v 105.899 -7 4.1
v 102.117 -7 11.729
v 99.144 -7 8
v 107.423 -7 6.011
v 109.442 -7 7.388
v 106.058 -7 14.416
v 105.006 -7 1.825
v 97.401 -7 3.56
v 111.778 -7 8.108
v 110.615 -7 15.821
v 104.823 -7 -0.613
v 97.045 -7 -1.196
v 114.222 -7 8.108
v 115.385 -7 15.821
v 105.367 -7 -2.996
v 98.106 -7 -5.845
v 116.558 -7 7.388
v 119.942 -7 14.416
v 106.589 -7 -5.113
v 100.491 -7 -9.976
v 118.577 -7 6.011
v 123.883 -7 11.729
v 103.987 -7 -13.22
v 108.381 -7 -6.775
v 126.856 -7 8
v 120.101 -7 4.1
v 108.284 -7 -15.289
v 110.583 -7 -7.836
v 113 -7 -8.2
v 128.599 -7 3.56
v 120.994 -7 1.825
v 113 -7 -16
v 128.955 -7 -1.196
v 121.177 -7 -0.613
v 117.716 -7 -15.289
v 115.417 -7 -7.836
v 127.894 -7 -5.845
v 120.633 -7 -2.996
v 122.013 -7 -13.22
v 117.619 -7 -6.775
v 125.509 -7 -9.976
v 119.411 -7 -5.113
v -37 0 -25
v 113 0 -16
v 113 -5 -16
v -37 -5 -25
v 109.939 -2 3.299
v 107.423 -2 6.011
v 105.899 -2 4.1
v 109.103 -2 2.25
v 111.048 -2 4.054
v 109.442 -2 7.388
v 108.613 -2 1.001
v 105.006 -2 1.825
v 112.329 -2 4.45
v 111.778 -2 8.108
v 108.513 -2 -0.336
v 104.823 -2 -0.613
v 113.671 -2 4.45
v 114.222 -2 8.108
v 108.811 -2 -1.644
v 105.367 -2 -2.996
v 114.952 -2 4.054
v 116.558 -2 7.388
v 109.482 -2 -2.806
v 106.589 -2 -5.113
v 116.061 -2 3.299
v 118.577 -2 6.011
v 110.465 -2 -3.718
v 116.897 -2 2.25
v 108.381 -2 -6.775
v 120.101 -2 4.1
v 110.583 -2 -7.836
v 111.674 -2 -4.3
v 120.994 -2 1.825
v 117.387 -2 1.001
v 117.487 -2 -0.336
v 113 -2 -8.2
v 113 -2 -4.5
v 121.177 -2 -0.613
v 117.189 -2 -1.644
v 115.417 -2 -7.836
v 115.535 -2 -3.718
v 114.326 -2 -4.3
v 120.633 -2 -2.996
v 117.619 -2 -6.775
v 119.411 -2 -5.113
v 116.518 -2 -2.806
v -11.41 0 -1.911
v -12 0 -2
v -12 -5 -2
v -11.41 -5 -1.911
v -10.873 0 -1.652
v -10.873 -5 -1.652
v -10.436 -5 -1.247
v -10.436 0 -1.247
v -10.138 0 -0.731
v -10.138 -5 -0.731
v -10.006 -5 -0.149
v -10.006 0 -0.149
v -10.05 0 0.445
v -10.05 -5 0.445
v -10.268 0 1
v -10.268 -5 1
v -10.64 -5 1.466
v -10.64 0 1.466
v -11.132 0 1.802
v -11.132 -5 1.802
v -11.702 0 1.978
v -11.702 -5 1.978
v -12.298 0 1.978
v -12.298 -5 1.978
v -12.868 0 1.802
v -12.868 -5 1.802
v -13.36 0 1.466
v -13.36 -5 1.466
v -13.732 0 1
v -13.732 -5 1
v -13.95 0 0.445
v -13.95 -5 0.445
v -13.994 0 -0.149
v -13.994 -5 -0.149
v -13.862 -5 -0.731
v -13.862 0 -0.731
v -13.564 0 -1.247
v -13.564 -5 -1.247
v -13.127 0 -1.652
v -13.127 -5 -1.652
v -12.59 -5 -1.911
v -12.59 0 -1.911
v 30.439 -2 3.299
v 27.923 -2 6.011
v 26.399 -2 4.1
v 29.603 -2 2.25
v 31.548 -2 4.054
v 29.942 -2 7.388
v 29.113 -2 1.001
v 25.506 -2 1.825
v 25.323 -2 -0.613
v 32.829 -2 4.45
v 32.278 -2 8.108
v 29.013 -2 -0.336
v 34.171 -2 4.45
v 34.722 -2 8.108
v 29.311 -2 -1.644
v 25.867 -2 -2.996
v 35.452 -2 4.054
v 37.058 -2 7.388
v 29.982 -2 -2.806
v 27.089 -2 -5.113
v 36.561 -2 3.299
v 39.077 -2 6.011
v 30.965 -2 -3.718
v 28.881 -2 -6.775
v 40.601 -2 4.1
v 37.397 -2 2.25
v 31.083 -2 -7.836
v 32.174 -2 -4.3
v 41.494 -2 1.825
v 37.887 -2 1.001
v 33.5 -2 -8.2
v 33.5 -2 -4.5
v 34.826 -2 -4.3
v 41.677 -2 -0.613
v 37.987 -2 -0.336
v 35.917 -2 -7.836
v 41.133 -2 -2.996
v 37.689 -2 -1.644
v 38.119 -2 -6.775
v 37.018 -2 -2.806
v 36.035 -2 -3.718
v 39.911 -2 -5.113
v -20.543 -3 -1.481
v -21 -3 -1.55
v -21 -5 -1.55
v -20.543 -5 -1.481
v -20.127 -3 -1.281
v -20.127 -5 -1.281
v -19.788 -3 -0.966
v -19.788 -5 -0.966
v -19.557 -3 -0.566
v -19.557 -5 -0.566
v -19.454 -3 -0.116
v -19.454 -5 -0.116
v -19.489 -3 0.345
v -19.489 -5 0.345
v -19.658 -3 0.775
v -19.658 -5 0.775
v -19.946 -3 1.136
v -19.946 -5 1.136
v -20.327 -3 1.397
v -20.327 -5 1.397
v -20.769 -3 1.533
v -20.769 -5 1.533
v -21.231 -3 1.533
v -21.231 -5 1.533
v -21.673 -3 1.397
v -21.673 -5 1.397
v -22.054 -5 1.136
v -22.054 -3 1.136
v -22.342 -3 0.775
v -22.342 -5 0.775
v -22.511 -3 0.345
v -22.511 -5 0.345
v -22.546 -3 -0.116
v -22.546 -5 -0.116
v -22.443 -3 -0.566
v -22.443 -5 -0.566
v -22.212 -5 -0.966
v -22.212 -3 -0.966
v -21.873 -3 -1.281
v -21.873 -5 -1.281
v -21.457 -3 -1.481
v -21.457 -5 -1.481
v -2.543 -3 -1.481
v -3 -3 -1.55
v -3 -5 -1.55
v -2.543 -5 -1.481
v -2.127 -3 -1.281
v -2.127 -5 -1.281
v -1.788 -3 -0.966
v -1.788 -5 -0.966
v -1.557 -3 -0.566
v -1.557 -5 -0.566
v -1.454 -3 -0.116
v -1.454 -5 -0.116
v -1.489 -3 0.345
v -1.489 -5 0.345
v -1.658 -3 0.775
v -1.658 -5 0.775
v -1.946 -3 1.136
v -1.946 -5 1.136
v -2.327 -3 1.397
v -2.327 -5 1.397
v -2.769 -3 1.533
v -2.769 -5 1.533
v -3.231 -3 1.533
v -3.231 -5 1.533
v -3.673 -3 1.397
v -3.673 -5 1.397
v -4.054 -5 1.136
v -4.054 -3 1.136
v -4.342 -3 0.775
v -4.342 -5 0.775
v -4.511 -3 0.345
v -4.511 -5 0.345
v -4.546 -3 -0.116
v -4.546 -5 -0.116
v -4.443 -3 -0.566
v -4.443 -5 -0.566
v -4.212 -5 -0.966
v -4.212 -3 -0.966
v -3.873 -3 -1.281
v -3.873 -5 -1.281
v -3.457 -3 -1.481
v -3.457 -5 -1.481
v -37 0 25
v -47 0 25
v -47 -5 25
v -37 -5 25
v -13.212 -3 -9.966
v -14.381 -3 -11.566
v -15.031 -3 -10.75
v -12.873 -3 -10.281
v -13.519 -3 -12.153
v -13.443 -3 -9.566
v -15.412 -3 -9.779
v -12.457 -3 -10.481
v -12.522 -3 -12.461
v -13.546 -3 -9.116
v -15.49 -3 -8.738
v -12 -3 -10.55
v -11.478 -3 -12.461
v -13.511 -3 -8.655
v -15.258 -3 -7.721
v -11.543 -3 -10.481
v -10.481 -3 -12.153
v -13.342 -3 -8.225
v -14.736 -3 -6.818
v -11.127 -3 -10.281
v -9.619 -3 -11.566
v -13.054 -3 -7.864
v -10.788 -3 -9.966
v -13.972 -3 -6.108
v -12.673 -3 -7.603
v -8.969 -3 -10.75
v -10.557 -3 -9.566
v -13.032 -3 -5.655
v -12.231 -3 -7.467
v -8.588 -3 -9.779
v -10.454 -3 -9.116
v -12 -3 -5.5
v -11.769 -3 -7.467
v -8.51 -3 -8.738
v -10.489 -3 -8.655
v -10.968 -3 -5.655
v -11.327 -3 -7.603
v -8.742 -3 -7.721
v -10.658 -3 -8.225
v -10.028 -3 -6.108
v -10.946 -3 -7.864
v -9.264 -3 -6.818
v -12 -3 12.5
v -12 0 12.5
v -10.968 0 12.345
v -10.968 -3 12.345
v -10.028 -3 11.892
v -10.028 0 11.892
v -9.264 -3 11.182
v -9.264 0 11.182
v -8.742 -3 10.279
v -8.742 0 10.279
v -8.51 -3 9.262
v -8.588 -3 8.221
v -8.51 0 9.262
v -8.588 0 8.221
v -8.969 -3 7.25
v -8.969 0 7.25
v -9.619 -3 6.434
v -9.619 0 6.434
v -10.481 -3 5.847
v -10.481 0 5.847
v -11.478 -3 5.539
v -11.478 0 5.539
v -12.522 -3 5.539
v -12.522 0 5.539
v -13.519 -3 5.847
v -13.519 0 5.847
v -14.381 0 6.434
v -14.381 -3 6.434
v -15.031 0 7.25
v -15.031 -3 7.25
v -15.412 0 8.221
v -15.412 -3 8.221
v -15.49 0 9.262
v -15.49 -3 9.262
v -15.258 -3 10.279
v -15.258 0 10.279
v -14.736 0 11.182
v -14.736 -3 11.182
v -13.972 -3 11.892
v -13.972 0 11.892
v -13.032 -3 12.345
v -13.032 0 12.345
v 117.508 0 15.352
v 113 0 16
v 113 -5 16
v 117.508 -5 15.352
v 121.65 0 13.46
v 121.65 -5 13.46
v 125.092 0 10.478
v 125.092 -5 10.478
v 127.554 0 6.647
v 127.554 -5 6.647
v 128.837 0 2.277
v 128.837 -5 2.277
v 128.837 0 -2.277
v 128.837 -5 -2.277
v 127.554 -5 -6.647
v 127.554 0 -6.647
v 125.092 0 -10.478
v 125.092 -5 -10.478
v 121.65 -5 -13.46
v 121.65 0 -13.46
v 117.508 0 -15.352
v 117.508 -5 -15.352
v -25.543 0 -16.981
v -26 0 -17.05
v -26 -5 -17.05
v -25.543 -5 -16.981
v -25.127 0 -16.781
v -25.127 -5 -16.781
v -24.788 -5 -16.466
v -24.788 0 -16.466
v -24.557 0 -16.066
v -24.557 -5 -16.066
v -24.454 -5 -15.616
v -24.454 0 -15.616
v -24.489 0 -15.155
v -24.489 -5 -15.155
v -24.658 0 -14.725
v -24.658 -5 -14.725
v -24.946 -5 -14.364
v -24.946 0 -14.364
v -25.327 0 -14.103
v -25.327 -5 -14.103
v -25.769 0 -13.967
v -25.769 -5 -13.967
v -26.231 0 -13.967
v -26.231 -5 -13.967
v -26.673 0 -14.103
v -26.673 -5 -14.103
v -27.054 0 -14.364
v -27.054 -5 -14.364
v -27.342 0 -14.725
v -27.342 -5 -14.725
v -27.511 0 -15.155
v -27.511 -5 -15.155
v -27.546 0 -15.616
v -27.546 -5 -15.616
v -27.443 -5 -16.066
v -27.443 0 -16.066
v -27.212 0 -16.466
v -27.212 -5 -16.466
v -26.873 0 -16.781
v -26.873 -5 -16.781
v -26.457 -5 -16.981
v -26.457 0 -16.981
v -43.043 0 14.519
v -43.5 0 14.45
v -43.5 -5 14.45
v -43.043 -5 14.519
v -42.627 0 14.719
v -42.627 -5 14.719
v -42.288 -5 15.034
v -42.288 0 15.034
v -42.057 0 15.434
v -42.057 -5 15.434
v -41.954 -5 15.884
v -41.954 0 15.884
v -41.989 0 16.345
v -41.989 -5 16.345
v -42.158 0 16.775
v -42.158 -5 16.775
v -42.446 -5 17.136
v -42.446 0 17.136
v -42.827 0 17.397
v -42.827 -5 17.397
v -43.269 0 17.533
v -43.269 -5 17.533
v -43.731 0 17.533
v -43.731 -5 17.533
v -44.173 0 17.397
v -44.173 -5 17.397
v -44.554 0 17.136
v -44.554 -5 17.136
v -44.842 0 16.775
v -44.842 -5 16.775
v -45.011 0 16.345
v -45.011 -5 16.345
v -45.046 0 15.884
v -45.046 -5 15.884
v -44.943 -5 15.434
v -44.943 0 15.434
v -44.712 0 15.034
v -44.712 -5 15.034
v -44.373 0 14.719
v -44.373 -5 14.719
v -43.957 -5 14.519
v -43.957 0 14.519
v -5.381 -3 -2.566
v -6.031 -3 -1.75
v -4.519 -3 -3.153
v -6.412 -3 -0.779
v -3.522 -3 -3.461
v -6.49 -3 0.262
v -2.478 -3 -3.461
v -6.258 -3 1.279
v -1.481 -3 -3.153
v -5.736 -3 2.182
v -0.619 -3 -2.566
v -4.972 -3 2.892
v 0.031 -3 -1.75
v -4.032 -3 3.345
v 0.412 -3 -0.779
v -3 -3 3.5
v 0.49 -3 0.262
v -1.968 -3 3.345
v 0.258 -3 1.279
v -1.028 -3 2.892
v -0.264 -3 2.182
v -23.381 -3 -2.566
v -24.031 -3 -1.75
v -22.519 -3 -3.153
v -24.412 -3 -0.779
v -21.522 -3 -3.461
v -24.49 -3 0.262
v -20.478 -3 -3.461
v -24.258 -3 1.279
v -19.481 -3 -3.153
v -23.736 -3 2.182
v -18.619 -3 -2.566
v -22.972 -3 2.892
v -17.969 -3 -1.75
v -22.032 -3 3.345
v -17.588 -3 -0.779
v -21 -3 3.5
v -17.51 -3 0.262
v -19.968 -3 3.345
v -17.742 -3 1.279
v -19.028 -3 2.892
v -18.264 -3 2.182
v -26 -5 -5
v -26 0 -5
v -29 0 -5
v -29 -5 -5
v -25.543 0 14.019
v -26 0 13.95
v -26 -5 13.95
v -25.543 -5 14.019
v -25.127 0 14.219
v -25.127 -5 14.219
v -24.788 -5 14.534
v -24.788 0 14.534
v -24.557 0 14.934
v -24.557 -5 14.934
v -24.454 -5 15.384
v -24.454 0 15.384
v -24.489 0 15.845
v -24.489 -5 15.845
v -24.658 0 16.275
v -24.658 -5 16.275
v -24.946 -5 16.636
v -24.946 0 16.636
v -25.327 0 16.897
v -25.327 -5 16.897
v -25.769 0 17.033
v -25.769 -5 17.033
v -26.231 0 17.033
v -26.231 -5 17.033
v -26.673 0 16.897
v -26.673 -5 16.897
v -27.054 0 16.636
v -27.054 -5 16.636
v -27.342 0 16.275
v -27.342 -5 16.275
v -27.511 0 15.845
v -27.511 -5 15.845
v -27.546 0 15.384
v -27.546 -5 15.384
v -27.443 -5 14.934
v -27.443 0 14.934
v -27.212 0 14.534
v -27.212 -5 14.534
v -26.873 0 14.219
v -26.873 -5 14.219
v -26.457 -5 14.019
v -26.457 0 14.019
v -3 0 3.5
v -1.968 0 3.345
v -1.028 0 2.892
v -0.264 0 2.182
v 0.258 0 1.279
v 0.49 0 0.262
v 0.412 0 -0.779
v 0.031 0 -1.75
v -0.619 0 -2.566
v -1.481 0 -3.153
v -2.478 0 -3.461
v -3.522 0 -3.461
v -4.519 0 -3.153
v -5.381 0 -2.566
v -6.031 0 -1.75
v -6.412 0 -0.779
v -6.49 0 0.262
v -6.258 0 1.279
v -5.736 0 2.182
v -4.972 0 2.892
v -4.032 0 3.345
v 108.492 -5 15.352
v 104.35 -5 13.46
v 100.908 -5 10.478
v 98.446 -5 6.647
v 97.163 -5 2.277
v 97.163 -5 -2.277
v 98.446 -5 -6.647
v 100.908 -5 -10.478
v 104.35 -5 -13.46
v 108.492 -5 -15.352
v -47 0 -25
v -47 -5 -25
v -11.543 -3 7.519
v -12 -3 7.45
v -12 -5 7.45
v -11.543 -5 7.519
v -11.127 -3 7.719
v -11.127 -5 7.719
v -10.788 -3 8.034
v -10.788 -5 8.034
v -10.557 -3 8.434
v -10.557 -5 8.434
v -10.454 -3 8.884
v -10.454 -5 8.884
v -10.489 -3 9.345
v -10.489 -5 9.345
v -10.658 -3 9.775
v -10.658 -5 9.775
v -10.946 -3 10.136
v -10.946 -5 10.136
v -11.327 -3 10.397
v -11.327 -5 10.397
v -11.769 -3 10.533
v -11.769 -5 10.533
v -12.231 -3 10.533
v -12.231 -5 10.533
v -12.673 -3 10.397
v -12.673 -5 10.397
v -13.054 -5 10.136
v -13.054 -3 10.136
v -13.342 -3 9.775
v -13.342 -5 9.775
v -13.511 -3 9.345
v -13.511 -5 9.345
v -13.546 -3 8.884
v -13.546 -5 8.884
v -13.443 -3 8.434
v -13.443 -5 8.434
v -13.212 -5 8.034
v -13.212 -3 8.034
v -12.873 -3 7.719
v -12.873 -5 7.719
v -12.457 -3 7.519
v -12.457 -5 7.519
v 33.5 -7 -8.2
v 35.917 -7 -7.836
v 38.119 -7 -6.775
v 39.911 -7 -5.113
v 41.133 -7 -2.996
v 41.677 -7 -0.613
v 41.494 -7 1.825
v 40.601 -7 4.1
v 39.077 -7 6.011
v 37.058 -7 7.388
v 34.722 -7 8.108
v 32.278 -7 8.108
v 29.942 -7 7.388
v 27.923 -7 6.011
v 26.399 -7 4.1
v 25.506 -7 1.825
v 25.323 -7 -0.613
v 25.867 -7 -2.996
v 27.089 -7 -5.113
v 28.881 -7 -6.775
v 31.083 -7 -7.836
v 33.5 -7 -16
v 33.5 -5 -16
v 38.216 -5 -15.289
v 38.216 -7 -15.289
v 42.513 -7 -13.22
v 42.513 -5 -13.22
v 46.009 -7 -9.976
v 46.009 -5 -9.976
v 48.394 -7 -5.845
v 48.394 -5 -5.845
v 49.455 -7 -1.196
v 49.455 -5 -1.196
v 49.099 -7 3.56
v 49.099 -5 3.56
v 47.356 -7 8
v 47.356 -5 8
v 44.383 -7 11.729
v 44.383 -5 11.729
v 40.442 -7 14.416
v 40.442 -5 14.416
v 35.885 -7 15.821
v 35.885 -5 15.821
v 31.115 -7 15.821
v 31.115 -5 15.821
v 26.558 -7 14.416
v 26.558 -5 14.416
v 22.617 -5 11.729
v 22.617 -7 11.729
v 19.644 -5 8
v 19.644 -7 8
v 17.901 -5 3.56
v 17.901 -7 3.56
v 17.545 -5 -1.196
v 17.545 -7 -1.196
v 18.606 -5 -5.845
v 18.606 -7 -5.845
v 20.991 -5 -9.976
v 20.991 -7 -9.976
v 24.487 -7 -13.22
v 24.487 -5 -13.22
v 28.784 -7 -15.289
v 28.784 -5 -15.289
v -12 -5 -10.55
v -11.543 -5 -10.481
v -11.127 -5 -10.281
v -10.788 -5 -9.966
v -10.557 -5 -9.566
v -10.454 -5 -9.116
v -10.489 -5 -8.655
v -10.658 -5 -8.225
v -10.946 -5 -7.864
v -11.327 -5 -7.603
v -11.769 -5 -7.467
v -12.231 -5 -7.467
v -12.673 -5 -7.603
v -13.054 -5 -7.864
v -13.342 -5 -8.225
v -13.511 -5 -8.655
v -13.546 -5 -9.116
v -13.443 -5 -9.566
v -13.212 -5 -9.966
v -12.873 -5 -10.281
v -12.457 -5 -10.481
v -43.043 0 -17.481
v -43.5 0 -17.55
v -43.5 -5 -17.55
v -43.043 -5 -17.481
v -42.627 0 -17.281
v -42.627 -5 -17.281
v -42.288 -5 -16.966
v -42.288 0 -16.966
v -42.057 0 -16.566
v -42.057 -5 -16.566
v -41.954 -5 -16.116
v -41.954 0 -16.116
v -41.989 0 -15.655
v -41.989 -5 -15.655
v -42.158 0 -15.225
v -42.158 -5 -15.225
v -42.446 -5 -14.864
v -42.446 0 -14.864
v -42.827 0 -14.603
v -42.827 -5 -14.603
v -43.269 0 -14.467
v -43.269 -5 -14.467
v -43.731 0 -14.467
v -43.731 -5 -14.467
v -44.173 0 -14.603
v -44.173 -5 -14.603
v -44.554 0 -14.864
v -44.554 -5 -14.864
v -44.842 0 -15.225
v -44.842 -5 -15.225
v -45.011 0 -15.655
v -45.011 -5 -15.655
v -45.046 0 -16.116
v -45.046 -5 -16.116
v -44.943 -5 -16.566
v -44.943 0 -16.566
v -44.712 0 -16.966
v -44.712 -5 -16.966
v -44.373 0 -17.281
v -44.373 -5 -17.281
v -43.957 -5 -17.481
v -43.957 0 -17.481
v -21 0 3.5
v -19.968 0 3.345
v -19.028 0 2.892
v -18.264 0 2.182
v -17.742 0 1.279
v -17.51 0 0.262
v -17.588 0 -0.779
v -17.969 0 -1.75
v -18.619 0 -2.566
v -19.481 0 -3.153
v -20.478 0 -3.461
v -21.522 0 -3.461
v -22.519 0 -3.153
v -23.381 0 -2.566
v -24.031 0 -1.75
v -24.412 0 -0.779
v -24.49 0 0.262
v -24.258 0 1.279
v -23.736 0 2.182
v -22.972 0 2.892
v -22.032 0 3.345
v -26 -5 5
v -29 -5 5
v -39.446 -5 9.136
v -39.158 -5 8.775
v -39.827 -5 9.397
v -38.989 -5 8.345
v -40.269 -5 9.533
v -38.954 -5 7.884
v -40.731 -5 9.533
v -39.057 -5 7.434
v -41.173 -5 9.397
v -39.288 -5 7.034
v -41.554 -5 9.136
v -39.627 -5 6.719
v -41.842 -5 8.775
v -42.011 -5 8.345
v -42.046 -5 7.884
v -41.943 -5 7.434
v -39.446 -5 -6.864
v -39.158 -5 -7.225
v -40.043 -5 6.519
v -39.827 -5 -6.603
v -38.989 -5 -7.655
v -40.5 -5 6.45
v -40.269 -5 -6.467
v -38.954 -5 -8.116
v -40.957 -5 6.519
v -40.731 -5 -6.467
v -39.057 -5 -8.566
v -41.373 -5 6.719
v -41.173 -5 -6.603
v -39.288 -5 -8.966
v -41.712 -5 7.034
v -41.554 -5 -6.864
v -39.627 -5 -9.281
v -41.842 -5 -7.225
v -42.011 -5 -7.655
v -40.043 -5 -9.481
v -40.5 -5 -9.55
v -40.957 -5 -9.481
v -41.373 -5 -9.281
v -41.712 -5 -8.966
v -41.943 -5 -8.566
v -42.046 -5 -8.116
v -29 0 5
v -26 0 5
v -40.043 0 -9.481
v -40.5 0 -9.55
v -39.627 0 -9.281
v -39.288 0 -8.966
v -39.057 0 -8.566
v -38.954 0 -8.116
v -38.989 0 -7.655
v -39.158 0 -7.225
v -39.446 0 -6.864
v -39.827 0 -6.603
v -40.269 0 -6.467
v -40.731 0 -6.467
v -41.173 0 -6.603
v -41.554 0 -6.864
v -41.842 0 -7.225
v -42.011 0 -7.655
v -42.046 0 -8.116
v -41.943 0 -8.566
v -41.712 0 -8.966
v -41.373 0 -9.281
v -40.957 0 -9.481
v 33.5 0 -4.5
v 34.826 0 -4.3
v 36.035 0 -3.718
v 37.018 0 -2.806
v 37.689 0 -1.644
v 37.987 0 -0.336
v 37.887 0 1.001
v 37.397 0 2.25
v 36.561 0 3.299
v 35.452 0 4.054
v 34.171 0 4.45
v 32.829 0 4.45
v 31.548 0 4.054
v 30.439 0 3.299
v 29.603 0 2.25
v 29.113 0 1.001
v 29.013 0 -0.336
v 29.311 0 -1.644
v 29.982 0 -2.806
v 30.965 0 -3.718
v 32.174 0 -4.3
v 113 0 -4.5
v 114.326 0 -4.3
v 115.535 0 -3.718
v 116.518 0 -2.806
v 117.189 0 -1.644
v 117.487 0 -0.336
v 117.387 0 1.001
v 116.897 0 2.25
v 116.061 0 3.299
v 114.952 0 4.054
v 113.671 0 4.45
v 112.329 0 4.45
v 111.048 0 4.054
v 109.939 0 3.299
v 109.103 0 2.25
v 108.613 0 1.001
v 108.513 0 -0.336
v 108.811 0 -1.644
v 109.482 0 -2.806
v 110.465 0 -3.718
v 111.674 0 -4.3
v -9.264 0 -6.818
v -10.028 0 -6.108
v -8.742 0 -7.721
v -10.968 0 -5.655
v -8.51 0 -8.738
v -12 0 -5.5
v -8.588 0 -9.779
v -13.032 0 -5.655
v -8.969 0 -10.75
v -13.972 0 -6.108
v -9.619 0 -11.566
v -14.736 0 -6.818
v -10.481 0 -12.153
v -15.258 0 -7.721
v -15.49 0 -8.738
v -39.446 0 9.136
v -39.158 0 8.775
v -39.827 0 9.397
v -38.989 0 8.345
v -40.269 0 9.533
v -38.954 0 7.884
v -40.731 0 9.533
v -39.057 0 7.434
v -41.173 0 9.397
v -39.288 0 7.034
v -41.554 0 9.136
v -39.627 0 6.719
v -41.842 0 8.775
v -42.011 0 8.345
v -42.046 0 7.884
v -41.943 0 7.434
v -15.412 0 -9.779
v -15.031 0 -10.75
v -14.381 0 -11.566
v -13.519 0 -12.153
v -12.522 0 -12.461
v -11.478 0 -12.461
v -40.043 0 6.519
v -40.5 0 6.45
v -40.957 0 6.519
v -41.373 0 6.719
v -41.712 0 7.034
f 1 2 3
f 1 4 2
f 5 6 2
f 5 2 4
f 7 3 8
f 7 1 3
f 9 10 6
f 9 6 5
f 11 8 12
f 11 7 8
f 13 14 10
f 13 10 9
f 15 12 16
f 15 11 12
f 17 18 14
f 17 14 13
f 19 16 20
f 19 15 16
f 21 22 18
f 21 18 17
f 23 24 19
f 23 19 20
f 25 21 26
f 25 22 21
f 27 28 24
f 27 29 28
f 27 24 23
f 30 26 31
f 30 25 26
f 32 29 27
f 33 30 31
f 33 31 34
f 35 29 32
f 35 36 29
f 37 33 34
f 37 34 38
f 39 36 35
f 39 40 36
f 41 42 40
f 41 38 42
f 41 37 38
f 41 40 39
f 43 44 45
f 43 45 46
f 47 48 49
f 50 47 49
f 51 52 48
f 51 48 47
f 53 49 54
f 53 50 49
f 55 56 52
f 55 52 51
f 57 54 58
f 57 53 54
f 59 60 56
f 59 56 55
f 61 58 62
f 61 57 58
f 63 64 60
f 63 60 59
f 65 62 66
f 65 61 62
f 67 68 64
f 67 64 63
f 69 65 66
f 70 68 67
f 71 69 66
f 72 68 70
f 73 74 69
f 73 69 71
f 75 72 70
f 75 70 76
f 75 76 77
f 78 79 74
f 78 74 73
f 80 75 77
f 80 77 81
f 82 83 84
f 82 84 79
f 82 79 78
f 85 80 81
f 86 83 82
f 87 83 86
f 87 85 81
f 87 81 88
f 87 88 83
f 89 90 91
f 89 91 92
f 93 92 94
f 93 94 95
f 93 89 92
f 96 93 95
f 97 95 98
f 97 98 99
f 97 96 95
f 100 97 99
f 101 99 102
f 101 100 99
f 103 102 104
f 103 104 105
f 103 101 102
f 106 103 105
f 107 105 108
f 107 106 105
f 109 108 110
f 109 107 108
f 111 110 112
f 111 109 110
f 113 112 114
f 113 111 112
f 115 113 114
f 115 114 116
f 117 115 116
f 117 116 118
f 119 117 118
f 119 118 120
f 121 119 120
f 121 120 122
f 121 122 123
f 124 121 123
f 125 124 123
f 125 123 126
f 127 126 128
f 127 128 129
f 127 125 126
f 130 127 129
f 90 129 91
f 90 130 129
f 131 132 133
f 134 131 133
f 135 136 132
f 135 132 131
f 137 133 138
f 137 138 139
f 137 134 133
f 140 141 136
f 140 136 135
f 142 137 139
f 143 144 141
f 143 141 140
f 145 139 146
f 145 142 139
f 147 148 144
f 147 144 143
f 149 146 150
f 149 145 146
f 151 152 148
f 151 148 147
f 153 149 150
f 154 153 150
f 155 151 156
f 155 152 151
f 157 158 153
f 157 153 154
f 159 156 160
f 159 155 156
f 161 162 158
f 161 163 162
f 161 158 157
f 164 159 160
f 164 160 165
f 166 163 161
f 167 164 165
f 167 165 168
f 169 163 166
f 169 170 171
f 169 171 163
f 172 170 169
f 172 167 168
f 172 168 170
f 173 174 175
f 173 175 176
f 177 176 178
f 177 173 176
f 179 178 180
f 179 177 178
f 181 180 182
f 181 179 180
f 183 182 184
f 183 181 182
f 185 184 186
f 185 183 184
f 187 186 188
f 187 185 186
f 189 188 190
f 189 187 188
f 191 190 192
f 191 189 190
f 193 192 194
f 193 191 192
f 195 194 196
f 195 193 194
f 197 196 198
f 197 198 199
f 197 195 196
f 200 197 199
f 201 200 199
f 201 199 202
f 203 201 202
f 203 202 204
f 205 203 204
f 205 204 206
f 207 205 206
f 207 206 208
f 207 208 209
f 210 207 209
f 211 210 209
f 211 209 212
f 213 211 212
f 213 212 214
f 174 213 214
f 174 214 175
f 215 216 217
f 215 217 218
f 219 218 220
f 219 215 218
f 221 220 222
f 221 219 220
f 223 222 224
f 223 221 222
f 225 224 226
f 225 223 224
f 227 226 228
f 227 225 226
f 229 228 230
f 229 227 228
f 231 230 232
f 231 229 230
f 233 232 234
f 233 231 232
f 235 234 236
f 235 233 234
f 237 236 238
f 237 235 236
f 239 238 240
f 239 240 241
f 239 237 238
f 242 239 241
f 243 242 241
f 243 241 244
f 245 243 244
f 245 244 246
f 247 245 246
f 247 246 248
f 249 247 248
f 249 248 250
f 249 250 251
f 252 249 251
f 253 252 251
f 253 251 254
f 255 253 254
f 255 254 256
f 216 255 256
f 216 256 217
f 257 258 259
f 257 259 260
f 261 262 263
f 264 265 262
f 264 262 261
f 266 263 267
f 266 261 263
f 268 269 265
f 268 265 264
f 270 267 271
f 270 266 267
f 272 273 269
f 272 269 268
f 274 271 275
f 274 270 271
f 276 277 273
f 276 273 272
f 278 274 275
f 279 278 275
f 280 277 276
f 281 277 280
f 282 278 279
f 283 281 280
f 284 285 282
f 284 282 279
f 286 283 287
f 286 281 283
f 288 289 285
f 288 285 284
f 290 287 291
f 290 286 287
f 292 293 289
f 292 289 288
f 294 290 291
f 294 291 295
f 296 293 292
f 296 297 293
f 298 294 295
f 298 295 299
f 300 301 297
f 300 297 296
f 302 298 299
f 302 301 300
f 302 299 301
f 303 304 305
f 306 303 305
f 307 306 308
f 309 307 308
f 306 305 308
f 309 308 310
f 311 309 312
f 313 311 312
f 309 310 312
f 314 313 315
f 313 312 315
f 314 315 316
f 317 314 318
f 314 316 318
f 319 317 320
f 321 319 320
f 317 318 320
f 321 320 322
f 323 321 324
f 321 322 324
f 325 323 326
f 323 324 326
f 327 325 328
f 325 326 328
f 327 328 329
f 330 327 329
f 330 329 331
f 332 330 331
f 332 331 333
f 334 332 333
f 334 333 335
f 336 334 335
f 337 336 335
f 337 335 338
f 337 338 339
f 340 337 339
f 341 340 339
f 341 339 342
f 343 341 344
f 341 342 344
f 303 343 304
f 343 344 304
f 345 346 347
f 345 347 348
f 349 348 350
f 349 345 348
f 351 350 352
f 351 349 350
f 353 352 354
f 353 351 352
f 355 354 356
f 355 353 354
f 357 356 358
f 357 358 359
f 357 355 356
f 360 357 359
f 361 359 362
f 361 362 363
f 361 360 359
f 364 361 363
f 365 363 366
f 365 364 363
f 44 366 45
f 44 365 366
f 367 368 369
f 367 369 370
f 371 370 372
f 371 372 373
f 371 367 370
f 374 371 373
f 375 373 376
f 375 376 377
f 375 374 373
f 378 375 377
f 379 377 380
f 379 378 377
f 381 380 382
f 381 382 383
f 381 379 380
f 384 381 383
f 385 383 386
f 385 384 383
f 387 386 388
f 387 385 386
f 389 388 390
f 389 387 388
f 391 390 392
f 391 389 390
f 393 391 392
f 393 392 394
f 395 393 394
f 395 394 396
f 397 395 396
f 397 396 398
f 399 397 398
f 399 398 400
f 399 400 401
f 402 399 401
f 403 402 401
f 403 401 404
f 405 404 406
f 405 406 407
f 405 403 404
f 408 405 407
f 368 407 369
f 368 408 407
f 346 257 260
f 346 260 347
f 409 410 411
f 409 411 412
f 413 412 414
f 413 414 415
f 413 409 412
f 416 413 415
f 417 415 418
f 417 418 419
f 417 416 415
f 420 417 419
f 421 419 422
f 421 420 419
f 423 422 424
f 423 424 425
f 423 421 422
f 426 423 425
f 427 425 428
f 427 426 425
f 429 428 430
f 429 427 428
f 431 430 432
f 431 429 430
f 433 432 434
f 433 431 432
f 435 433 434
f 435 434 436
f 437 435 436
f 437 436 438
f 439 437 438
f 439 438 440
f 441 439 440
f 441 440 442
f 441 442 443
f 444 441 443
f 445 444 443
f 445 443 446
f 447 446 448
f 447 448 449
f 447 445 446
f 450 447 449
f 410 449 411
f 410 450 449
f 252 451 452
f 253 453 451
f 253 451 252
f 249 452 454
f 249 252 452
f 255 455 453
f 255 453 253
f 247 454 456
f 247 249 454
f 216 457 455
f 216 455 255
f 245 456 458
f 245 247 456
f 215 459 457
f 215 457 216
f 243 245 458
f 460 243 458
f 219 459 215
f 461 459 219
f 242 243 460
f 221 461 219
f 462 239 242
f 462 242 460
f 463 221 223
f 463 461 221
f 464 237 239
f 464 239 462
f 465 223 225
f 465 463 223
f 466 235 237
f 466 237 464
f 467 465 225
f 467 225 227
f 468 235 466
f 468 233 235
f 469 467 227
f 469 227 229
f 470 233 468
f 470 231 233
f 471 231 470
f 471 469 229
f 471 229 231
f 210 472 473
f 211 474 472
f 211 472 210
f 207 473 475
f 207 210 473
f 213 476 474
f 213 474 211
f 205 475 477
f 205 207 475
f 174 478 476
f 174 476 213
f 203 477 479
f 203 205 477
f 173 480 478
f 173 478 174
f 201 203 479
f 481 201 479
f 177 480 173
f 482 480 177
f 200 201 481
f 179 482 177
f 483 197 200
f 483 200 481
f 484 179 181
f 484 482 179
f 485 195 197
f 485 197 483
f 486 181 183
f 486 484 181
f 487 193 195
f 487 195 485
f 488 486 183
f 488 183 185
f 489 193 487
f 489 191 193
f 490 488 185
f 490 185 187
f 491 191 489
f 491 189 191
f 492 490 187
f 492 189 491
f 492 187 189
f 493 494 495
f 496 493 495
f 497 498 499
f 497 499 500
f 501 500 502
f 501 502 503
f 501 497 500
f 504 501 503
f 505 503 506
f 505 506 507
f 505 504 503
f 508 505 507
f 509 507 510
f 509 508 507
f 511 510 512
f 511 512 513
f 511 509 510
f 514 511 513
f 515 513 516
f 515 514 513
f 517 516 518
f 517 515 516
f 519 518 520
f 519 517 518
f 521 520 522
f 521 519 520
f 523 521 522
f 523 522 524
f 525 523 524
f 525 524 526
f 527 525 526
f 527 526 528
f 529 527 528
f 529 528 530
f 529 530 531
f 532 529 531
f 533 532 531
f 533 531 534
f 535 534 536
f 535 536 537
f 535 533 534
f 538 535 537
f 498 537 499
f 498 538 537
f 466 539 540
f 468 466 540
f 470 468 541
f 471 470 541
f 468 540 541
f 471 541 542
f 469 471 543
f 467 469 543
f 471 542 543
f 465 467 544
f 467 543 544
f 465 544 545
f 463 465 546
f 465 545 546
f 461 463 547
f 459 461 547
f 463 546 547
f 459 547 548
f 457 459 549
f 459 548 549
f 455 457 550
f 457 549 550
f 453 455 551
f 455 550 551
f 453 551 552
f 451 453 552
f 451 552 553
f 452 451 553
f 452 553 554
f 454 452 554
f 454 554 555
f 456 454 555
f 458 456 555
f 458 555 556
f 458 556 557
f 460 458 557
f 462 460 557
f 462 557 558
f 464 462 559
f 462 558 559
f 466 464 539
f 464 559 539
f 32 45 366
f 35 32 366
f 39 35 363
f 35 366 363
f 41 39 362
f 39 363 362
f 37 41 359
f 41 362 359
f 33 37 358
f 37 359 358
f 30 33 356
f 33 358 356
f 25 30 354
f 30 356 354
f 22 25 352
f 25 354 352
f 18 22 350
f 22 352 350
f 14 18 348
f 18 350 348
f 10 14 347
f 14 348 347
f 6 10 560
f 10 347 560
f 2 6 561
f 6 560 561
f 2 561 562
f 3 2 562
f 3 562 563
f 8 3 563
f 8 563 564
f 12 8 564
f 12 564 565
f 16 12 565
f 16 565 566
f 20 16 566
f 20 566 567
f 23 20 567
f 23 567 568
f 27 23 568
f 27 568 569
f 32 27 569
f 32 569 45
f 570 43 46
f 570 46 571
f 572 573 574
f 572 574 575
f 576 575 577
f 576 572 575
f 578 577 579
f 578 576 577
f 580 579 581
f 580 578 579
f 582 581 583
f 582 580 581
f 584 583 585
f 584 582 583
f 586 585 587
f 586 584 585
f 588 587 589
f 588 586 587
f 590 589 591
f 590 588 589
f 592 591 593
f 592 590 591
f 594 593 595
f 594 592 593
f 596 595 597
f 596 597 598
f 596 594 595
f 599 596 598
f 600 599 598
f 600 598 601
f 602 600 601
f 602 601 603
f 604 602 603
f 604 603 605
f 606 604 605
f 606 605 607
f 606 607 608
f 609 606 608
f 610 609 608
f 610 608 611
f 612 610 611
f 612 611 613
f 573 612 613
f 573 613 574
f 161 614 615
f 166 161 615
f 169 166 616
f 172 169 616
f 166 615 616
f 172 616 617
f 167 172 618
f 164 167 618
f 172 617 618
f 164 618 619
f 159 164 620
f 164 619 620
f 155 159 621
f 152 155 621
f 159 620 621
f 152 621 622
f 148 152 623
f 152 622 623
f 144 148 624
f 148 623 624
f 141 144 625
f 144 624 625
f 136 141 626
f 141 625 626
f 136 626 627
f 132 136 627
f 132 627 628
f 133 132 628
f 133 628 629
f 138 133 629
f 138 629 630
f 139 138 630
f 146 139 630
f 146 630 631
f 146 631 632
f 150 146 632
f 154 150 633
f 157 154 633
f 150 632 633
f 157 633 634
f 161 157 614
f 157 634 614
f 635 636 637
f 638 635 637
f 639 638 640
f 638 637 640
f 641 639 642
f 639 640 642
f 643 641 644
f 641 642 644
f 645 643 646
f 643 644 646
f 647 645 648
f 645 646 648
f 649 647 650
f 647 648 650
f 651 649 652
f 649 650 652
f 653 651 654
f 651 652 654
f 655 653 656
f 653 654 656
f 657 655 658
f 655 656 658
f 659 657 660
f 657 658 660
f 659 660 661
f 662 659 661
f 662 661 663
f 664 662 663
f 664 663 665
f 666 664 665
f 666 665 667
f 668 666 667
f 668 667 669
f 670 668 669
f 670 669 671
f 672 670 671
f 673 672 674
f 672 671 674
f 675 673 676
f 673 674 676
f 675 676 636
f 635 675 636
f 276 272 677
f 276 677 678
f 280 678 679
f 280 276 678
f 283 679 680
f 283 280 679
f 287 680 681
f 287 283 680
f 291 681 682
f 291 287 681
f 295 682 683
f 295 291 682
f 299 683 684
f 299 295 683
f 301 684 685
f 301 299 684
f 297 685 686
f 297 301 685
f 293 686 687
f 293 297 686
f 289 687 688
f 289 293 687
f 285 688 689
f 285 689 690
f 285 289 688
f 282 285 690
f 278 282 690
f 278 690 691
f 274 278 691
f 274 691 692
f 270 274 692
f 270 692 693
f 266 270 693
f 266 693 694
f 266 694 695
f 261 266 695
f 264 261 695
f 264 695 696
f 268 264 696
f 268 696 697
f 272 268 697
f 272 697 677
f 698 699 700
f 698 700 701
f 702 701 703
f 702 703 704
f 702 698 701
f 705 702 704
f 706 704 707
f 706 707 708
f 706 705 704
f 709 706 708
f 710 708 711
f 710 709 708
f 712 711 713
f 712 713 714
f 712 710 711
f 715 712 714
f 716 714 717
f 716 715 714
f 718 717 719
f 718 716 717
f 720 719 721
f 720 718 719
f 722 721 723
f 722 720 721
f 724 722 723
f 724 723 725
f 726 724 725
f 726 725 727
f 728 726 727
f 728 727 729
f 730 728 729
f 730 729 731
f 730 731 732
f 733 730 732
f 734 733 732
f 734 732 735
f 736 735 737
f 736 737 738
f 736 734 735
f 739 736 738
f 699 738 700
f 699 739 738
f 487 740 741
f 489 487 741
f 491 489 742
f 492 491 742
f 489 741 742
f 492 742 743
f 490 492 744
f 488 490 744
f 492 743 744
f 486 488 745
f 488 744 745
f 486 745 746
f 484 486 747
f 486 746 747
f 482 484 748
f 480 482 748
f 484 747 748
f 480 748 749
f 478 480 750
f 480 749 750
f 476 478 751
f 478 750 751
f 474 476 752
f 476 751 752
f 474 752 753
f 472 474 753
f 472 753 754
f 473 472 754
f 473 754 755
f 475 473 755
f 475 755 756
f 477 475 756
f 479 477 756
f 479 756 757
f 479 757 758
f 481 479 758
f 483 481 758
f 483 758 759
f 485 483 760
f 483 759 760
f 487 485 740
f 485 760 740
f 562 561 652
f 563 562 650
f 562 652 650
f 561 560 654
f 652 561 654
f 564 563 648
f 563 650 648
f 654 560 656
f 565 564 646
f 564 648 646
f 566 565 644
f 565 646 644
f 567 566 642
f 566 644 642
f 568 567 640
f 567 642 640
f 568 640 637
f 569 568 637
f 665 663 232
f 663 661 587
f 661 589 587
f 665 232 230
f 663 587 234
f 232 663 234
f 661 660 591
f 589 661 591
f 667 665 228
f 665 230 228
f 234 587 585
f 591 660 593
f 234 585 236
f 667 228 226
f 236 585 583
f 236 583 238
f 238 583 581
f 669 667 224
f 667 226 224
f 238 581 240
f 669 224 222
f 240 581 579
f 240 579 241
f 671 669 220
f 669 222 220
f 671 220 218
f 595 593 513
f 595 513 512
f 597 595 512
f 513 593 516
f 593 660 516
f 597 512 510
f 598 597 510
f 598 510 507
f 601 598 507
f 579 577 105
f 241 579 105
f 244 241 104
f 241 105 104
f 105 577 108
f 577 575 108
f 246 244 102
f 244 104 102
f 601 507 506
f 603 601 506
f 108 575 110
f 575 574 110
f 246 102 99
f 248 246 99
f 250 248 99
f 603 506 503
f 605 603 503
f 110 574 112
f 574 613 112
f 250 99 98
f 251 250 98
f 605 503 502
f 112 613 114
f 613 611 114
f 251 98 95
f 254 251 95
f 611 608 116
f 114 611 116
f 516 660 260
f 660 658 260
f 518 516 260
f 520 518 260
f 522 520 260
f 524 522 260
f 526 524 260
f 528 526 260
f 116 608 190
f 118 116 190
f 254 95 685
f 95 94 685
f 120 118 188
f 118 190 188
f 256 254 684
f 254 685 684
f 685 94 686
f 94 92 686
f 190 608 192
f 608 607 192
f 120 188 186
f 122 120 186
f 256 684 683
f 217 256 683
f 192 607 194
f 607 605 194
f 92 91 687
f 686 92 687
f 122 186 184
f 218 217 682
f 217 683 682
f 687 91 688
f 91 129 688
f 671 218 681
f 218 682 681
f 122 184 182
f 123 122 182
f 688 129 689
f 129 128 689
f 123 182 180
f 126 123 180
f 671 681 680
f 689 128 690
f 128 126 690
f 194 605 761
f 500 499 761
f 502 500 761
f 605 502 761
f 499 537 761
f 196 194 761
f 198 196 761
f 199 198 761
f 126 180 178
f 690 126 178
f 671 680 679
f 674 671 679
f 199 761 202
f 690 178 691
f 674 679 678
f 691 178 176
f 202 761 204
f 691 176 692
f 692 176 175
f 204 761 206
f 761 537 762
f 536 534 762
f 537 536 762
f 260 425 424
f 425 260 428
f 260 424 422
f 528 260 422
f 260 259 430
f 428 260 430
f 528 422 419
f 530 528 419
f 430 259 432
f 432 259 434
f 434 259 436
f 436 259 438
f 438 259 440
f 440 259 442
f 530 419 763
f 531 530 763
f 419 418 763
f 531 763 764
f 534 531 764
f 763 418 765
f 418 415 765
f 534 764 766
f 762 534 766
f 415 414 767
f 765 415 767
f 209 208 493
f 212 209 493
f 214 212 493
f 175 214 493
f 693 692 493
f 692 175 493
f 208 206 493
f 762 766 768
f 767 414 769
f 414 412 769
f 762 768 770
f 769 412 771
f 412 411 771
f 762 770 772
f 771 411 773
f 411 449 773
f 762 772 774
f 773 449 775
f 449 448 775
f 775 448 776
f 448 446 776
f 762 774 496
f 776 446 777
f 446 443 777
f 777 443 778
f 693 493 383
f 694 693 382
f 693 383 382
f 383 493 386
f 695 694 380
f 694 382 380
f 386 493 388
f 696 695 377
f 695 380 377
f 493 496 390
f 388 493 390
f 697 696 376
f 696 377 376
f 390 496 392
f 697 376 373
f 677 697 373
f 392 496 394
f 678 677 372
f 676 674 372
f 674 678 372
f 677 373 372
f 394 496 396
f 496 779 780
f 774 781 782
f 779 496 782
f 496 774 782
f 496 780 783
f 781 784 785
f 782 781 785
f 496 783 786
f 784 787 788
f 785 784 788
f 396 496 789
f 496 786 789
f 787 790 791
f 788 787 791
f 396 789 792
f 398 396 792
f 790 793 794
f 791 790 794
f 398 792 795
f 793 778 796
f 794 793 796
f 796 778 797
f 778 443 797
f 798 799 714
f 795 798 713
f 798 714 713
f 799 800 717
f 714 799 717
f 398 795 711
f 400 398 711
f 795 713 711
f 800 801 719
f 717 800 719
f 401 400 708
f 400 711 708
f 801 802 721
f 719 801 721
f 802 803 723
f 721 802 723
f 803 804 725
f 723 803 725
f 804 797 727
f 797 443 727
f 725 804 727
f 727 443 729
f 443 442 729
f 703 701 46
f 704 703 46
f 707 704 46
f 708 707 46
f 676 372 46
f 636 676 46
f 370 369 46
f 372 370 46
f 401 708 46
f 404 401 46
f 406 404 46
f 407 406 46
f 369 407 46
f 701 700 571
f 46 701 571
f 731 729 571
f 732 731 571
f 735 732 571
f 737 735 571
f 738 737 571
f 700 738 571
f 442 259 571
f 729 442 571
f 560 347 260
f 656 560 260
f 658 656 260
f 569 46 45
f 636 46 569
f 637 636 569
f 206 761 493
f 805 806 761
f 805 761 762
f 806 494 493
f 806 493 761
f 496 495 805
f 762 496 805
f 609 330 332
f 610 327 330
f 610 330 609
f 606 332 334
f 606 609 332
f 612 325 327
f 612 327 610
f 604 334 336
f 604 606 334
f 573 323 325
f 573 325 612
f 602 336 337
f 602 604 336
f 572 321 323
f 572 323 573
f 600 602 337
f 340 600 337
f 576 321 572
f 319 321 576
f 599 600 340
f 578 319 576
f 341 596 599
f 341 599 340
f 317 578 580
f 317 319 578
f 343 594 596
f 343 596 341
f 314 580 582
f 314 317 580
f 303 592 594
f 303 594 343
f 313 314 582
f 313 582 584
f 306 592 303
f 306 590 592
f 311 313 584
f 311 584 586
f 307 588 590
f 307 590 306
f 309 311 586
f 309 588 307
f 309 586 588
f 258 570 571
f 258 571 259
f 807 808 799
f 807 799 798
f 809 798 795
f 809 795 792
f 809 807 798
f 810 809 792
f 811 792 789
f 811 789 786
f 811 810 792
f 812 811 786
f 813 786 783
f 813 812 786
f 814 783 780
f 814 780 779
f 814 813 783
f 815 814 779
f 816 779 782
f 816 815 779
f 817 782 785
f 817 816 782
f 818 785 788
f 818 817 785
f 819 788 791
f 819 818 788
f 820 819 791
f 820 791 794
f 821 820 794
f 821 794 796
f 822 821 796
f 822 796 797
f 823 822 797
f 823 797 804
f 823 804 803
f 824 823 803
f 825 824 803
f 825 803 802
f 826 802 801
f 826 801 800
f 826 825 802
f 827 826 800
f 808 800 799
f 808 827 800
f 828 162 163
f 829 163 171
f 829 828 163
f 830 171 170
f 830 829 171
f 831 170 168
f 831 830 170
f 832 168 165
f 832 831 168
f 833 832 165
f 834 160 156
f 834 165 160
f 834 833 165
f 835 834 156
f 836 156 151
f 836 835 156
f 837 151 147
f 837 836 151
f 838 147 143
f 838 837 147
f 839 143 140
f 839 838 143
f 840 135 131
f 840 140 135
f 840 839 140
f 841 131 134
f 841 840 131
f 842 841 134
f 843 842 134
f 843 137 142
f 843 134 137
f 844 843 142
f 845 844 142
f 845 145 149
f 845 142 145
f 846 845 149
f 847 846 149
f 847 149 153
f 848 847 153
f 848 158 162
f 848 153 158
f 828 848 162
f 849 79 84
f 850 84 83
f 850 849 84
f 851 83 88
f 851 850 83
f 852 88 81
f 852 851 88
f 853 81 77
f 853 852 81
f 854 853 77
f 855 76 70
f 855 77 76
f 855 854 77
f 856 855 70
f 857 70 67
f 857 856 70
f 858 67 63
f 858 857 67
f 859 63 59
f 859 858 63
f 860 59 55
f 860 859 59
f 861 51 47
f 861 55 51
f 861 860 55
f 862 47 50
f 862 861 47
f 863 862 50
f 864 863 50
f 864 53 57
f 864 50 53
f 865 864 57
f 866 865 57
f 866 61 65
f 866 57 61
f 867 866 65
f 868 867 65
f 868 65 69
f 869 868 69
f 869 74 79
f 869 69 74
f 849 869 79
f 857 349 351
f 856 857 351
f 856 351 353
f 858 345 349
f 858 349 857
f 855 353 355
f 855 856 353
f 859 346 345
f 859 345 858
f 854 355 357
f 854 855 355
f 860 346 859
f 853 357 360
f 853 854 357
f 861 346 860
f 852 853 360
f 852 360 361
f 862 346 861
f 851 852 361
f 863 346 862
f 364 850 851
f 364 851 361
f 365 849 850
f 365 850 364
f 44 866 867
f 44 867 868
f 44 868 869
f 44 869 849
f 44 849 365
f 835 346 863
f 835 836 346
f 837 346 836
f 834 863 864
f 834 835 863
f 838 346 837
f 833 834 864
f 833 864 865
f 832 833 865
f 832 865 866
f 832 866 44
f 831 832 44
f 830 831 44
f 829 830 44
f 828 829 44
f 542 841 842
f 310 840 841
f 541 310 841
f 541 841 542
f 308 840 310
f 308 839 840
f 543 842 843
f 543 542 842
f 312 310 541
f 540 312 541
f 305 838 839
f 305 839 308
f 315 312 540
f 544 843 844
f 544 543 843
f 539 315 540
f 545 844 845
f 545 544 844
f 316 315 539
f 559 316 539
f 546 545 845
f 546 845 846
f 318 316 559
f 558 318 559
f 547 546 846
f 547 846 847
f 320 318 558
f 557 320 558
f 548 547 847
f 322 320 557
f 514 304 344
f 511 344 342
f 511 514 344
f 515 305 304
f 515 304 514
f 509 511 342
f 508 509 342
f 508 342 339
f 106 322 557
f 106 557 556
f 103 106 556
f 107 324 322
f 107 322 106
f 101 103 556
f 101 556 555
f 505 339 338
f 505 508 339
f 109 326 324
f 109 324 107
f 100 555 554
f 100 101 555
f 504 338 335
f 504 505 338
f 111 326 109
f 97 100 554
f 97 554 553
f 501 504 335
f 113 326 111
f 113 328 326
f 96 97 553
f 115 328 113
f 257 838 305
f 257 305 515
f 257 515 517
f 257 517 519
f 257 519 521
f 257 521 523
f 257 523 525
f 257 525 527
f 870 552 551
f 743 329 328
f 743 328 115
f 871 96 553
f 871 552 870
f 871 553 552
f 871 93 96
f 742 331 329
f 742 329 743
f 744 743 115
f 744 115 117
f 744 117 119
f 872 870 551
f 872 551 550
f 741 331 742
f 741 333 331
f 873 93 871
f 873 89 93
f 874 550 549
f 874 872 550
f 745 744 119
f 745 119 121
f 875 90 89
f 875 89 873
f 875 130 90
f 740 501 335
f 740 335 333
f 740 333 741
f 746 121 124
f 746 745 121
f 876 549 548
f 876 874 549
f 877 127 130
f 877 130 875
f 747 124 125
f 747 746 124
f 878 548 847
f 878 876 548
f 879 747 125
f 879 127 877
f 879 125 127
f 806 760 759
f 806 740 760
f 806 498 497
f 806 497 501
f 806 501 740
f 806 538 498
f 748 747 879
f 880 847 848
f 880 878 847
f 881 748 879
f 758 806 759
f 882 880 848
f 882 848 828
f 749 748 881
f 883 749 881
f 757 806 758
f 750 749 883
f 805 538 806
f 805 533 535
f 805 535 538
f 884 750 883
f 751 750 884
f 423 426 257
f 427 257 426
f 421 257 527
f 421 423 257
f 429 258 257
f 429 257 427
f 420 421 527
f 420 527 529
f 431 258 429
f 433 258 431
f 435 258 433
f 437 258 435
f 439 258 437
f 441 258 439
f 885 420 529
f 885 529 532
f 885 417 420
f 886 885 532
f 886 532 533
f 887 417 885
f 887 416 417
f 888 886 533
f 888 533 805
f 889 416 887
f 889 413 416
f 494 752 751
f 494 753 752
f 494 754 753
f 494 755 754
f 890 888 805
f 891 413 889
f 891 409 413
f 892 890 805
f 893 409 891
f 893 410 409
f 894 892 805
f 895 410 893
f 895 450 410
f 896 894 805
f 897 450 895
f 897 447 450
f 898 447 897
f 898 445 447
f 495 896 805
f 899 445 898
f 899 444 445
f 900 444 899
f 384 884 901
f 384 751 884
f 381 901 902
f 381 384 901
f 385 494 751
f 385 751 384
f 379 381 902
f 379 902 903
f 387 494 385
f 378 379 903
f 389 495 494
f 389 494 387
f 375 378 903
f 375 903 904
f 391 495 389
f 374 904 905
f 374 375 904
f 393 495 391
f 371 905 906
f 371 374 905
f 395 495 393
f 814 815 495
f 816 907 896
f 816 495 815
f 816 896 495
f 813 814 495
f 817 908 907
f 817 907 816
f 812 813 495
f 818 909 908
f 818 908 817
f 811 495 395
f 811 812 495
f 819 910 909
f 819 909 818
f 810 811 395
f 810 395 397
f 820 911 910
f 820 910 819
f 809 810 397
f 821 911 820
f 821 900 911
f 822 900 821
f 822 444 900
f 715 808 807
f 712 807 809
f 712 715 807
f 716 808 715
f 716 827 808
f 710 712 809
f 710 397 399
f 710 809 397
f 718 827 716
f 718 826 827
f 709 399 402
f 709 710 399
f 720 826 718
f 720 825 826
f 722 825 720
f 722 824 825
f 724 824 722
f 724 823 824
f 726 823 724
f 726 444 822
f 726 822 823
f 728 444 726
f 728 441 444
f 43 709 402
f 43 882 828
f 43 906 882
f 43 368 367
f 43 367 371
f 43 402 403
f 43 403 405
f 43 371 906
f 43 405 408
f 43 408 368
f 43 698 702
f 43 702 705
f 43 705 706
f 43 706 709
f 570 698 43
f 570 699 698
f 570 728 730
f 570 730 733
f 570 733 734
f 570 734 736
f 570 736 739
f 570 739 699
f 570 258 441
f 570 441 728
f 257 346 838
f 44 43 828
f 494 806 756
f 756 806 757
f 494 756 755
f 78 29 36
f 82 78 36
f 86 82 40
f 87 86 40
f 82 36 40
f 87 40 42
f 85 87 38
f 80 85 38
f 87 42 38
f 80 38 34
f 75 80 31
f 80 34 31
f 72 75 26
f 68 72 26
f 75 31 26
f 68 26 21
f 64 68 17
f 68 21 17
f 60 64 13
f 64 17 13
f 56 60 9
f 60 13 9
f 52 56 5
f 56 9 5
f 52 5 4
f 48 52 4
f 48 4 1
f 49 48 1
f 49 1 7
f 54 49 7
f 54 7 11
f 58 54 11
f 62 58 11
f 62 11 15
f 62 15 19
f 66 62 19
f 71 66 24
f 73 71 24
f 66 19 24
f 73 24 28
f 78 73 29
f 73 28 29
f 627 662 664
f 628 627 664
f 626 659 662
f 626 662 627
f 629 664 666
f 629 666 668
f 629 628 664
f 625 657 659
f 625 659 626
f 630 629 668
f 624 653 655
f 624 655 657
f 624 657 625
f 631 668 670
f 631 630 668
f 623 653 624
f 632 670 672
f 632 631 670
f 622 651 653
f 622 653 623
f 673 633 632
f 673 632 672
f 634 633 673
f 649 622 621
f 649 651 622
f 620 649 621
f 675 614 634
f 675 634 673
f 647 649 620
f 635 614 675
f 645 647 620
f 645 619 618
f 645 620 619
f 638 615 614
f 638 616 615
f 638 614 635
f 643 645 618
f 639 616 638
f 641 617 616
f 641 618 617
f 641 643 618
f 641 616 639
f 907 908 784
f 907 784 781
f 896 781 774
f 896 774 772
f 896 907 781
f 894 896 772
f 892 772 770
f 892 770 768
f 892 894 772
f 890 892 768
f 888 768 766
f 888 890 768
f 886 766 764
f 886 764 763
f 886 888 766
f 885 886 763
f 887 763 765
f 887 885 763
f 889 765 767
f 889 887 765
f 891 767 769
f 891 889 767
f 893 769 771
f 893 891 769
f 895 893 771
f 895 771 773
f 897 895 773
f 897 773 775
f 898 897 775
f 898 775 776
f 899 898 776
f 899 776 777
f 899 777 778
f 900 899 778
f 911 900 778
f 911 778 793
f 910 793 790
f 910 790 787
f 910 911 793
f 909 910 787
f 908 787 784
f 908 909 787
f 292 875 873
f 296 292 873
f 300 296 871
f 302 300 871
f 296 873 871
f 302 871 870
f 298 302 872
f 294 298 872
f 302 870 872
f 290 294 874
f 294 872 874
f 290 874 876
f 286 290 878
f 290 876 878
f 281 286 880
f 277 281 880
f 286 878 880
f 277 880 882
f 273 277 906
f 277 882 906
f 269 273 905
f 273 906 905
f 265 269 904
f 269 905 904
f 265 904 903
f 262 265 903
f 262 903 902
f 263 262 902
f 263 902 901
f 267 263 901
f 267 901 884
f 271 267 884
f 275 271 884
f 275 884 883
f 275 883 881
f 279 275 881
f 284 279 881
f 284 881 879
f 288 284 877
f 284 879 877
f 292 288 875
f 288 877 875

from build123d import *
from build123d.topology import SkipClean

# Parameters (mm, degrees)
SKETCH28_R           = 1.55
SKETCH28_R_2         = 4.5
SKETCH28_R_3         = 2
SKETCH28_W           = 10
SKETCH28_H           = 3
BOSS_EXTRUDE10_DEPTH = 5
SKETCH29_R           = 16
BOSS_EXTRUDE11_DEPTH = 2
SKETCH30_R           = 8.2
CUT_EXTRUDE1_DEPTH   = 5
SKETCH31_R           = 3.5
CUT_EXTRUDE2_DEPTH   = 3


with BuildPart() as part:
    # Sketch28 → Boss-Extrude10 (new body)
    with BuildSketch(Plane(origin=(-32, 0, 0), x_dir=(0, 0, 1), z_dir=(0, -1, 0))):
        with BuildLine():
            Line((-25, 15), (25, 15))
            Line((25, 15), (25, 5))
            Line((25, 5), (16, -145))
            ThreePointArc((16, -145), (0, -161), (-16, -145))
            Line((-16, -145), (-25, 5))
            Line((-25, 5), (-25, 15))
        make_face()
        with Locations((8, 8.5)):
            Circle(SKETCH28_R, mode=Mode.SUBTRACT)
        with Locations((-8, 8.5)):
            Circle(SKETCH28_R, mode=Mode.SUBTRACT)
        with Locations((16, 11.5)):
            Circle(SKETCH28_R, mode=Mode.SUBTRACT)
        with Locations((-16, 11.5)):
            Circle(SKETCH28_R, mode=Mode.SUBTRACT)
        with Locations((-15.5, -6)):
            Circle(SKETCH28_R, mode=Mode.SUBTRACT)
        with Locations((15.5, -6)):
            Circle(SKETCH28_R, mode=Mode.SUBTRACT)
        with Locations((0, -65.5)):
            Circle(SKETCH28_R_2, mode=Mode.SUBTRACT)
        with Locations((0, -20)):
            Circle(SKETCH28_R_3, mode=Mode.SUBTRACT)
        with Locations((0, -145)):
            Circle(SKETCH28_R_2, mode=Mode.SUBTRACT)
        with Locations((-9, -20)):
            Circle(SKETCH28_R, mode=Mode.SUBTRACT)
        with Locations((0, -11)):
            Circle(SKETCH28_R, mode=Mode.SUBTRACT)
        with Locations((9, -20)):
            Circle(SKETCH28_R, mode=Mode.SUBTRACT)
        with Locations((0, -29)):
            Circle(SKETCH28_R, mode=Mode.SUBTRACT)
        with Locations((0, -4.5)):
            Rectangle(SKETCH28_W, SKETCH28_H, mode=Mode.SUBTRACT)
    extrude(amount=BOSS_EXTRUDE10_DEPTH)

    # Sketch29 → Boss-Extrude11 (add)
    with SkipClean():  # the faces are left unmerged after this step: merging them gives an invalid solid
        with BuildSketch(Plane.XZ.offset(5)):
            with Locations((33.5, 0)):
                Circle(SKETCH29_R)
            with Locations((113, 0)):
                Circle(SKETCH29_R)
        extrude(amount=BOSS_EXTRUDE11_DEPTH)
    add(part.part.scale(1), mode=Mode.REPLACE)  # the faces are merged on a copy

    # Sketch30 → Cut-Extrude1 (cut)
    with BuildSketch(Plane.XZ.offset(7)):
        with Locations((33.5, 0)):
            Circle(SKETCH30_R)
        with Locations((113, 0)):
            Circle(SKETCH30_R)
    extrude(amount=-CUT_EXTRUDE1_DEPTH, mode=Mode.SUBTRACT)

    # Sketch31 → Cut-Extrude2 (cut)
    with BuildSketch(Plane(origin=(0, 0, 0), x_dir=(1, 0, 0), z_dir=(0, 1, 0))):
        with Locations((-12, 9)):
            Circle(SKETCH31_R)
        with Locations((-3, 0)):
            Circle(SKETCH31_R)
        with Locations((-12, -9)):
            Circle(SKETCH31_R)
        with Locations((-21, 0)):
            Circle(SKETCH31_R)
    extrude(amount=-CUT_EXTRUDE2_DEPTH, mode=Mode.SUBTRACT)


solid = part.part
